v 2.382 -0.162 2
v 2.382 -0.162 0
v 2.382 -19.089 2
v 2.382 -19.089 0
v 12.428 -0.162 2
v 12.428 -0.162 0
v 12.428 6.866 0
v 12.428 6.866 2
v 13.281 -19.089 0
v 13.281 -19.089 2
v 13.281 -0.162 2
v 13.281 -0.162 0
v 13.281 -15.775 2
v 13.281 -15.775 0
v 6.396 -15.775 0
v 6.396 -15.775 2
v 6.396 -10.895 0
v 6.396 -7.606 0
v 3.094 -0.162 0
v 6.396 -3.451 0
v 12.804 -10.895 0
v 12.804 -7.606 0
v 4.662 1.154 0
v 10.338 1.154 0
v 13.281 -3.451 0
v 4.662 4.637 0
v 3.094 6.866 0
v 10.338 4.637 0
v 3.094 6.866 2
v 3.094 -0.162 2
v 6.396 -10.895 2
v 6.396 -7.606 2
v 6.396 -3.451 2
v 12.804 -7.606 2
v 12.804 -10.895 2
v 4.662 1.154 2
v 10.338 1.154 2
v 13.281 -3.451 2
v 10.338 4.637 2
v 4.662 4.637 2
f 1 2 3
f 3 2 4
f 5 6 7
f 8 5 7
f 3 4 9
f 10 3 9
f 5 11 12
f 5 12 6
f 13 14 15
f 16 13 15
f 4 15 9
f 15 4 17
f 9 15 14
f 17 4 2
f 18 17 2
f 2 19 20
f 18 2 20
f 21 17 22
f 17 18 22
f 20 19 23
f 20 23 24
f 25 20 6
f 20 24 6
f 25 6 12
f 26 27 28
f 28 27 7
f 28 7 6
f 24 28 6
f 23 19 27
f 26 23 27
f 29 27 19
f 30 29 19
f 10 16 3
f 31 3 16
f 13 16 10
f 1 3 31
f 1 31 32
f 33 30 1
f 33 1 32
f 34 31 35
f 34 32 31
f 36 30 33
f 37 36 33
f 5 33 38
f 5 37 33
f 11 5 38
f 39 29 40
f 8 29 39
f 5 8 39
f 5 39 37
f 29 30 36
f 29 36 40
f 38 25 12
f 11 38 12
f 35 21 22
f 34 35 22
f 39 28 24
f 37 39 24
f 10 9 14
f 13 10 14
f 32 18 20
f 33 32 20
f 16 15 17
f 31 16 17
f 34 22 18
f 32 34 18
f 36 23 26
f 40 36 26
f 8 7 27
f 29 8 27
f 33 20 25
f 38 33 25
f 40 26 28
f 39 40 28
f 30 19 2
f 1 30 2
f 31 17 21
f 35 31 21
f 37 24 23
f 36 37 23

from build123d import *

# Parameters (mm, degrees)
F0_W     = 4.4058337156
F0_H     = 0.9129986805
F0_W_2   = 4.9275004491
F1_DEPTH = 2


with BuildPart() as f1:
    # F0 (on Top) → F1 (new body)
    with BuildSketch(Plane.XY):
        with Locations((5.2970831422, -0.618056921)):
            Rectangle(F0_W, F0_H)
        Polygon((7.5, -1.0745562613), (3.0941662844, -1.0745562613), (3.0941662844, -0.1615575808), (2.381938691, -0.1615575808), (2.381938691, -19.0886495443), (13.2808616404, -19.0886495443), (13.2808616404, -15.7746478873), (6.396023198, -15.7746478873), (6.396023198, -10.8947804474), (12.8044739022, -10.8947804474), (12.8044739022, -7.6056338028), (6.396023198, -7.6056338028), (6.396023198, -3.4507042254), (13.2808616404, -3.4507042254), (13.2808616404, -0.1615575808), (12.4275004491, -0.1615575808), (12.4275004491, -1.0745562613), align=None)
        with Locations((9.9637502246, -0.618056921)):
            Rectangle(F0_W_2, F0_H)
        Polygon((3.0941662844, 6.8657421507), (3.0941662844, -0.1615575808), (7.5, -0.1615575808), (7.5, 1.1542992434), (4.6620512009, 1.1542992434), (4.6620512009, 4.636886646), (7.5, 4.636886646), (7.5, 6.8657421507), align=None)
        Polygon((7.5, 1.1542992434), (7.5, -0.1615575808), (12.4275004491, -0.1615575808), (12.4275004491, 6.8657421507), (7.5, 6.8657421507), (7.5, 4.636886646), (10.3379487991, 4.636886646), (10.3379487991, 1.1542992434), align=None)
    extrude(amount=F1_DEPTH)


solid = f1.part
